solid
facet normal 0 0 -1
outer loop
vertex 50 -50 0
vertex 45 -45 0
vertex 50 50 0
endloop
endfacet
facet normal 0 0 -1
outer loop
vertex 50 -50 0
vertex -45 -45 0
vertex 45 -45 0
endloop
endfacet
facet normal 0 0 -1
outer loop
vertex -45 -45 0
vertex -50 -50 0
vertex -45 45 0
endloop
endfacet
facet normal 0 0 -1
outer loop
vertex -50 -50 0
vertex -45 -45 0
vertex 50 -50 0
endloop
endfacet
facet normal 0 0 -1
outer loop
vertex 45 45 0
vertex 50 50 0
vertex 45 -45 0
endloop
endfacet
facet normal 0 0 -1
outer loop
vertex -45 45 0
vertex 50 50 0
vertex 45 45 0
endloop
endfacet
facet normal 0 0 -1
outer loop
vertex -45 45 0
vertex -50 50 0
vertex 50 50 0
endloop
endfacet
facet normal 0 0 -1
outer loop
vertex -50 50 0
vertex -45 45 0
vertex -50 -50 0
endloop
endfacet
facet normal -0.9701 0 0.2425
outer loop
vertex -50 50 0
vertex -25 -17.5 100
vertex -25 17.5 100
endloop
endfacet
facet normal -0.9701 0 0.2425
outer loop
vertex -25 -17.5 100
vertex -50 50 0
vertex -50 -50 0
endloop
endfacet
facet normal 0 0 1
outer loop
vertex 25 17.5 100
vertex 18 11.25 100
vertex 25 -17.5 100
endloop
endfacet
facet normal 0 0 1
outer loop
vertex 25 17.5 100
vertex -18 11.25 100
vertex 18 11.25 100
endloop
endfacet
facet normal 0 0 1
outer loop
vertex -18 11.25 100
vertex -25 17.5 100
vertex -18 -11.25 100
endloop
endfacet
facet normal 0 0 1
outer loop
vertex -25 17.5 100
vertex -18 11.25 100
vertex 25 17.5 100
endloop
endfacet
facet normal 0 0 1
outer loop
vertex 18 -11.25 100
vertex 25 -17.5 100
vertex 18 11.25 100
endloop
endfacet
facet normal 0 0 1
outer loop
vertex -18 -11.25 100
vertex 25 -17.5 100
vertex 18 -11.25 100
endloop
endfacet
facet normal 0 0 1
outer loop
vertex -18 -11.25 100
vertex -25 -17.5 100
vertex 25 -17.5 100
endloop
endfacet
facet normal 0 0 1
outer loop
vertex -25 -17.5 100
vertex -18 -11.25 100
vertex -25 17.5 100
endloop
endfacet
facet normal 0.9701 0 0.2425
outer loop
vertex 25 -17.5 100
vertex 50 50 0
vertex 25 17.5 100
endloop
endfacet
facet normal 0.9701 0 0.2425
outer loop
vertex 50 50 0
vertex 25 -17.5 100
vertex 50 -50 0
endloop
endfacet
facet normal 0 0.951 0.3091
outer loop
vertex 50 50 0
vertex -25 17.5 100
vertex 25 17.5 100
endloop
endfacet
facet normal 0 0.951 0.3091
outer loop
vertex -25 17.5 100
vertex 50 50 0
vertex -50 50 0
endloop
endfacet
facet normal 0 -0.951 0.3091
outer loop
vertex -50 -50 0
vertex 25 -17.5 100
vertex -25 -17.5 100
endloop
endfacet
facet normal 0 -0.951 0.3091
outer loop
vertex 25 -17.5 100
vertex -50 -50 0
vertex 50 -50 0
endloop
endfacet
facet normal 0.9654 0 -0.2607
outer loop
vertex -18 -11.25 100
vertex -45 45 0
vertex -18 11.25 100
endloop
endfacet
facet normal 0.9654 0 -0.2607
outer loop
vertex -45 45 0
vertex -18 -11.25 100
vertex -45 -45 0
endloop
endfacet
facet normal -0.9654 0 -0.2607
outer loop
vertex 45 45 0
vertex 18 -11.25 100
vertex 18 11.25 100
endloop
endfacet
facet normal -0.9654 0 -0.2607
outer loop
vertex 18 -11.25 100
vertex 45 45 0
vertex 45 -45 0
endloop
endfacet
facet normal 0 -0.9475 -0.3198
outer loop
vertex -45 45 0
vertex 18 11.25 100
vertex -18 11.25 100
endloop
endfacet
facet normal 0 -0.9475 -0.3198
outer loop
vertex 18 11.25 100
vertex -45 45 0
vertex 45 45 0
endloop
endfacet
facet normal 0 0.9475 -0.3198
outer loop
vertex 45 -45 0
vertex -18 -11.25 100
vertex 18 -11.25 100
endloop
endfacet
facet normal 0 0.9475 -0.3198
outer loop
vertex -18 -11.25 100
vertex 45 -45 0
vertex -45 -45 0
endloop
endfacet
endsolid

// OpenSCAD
module hollow_square_huni() {
    difference() {
        // Dış huni (100x100'den 50x50'ye geçiş)
        linear_extrude(height=100, scale=[0.5, 0.35]) {
            square([100, 100], center=true);
        }

        // İç kısmı oyar (90x90'dan 40x40'a geçiş)
        translate([0, 0, 0]) // İç kısmı yukarıda başlat
            linear_extrude(height=100, scale=[0.4, 0.25]) {
                square([90, 90], center=true); // İç kısmı 90x90'dan başlatıyoruz
            }
    }
}

hollow_square_huni();
